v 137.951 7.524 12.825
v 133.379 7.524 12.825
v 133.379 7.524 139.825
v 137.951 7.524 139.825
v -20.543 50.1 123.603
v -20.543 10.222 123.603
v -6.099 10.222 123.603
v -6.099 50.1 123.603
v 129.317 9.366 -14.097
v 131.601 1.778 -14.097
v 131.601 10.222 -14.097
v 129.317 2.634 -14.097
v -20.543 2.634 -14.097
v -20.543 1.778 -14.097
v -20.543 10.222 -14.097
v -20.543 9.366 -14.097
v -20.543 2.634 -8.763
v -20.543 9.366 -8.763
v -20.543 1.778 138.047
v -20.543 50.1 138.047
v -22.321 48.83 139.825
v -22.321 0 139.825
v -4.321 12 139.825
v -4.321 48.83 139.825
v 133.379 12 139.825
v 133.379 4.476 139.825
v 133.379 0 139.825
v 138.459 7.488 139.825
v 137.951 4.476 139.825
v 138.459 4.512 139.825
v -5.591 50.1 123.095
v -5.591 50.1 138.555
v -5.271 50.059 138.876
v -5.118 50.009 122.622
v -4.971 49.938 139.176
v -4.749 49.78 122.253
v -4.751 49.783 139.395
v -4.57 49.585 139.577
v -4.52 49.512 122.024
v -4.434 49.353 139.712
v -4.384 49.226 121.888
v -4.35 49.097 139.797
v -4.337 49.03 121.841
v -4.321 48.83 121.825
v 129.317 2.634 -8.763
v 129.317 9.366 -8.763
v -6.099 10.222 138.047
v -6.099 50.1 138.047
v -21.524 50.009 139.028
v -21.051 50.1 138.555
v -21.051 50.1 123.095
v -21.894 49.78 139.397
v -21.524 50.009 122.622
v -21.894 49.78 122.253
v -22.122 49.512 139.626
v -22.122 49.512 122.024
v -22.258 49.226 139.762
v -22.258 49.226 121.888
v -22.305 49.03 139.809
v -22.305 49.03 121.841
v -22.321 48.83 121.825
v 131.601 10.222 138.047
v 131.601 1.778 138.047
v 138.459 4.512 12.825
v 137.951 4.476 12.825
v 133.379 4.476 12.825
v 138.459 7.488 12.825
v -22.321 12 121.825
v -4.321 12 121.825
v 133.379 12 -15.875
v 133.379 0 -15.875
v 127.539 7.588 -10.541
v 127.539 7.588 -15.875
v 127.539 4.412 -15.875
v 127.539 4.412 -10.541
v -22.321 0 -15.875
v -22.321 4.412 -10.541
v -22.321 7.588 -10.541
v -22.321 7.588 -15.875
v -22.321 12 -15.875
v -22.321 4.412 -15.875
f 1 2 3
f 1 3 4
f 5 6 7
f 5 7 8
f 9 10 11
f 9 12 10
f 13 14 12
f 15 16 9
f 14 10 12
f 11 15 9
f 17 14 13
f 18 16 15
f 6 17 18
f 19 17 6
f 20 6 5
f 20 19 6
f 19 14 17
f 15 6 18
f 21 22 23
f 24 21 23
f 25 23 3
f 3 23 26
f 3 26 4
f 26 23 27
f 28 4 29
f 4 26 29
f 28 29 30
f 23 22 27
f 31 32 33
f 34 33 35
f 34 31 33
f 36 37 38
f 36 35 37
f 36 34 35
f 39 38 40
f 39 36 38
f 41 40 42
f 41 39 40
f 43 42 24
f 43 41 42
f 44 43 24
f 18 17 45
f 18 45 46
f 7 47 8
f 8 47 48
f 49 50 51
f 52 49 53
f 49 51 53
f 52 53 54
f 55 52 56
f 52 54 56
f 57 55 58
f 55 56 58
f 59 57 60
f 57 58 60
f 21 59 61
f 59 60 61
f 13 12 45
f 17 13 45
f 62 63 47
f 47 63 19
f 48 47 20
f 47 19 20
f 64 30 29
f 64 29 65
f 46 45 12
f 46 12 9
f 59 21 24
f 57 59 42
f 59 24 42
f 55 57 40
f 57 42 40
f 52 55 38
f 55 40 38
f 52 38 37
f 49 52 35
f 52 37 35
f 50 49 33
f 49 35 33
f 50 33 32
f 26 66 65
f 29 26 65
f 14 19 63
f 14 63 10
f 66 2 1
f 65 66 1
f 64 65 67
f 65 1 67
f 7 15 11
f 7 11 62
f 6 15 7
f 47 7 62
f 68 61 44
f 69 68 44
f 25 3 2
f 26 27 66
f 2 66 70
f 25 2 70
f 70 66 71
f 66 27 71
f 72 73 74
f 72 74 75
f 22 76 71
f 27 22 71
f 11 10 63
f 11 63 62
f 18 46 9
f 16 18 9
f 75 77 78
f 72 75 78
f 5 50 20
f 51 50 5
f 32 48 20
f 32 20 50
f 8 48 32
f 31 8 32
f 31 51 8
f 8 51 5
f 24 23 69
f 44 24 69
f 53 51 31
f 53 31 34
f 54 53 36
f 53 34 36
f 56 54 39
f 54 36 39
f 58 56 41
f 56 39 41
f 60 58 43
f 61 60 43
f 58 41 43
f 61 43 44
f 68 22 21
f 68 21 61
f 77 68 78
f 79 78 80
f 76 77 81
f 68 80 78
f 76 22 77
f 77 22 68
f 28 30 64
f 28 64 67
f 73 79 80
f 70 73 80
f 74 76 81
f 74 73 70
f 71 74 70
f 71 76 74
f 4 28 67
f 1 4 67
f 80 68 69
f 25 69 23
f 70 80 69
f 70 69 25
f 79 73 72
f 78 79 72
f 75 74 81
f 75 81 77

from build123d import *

# Parameters (mm, degrees)
SKETCH1_W           = 155.7
SKETCH1_H           = 155.7
BOSS_EXTRUDE2_DEPTH = 12
SKETCH2_W           = 18
SKETCH2_H           = 18
BOSS_EXTRUDE3_DEPTH = 38.1
SKETCH3_W           = 5.08
SKETCH3_H           = 3.048
BOSS_EXTRUDE4_DEPTH = 127
CHAMFER1_SIZE       = 0.508
CHAMFER1_SIZE2      = 0.03552282
CHAMFER2_SIZE       = 0.508
CHAMFER2_SIZE2      = 0.03552282
SKETCH4_W           = 5.334
SKETCH4_H           = 3.175
CUT_EXTRUDE3_DEPTH  = 149.86
SHELL1_START        = -20.543212121
SHELL1_DEPTH        = 152.144
SHELL1_2_OUTLINE_W  = 39.878
SHELL1_2_OUTLINE_H  = 14.444
SHELL1_2_DEPTH      = 14.444
SHELL1_START_2      = 129.316787879
SHELL1_3_OUTLINE_W  = 6.731
SHELL1_3_OUTLINE_H  = 5.334
SHELL1_3_DEPTH      = 2.284
FILLET1_R           = 1.27


# Read off the part's stored shape, not the designer's step: Shell1
with BuildPart() as part:
    # Sketch1 → Boss-Extrude2 (new body)
    with BuildSketch(Plane(origin=(0, 0, 0), x_dir=(1, 0, 0), z_dir=(0, 1, 0))):
        with Locations((55.528787879, -61.975)):
            Rectangle(SKETCH1_W, SKETCH1_H)
    extrude(amount=BOSS_EXTRUDE2_DEPTH)

    # Sketch2 → Boss-Extrude3 (add)
    with BuildSketch(Plane(origin=(0, 12, 0), x_dir=(1, 0, 0), z_dir=(0, 1, 0))):
        with Locations((-13.321212121, -130.825)):
            Rectangle(SKETCH2_W, SKETCH2_H)
    extrude(amount=BOSS_EXTRUDE3_DEPTH)

    # Sketch3 → Boss-Extrude4 (add)
    with BuildSketch(Plane.XY.offset(139.825)):
        with Locations((135.918787879, 6)):
            Rectangle(SKETCH3_W, SKETCH3_H)
    extrude(amount=-BOSS_EXTRUDE4_DEPTH)

    # Chamfer1
    chamfer1_edges = [part.edges().sort_by_distance(p)[0] for p in [
        (138.458787879, 7.524, 76.325),
    ]]
    chamfer1_side = [part.faces().sort_by_distance(p)[0] for p in [
        (135.918787879, 7.524, 76.325),
    ]]
    chamfer(chamfer1_edges, length=CHAMFER1_SIZE, length2=CHAMFER1_SIZE2, reference=chamfer1_side[0])

    # Chamfer2
    chamfer2_edges = [part.edges().sort_by_distance(p)[0] for p in [
        (138.458787879, 4.476, 76.325),
    ]]
    chamfer2_side = [part.faces().sort_by_distance(p)[0] for p in [
        (135.918787879, 4.476, 76.325),
    ]]
    chamfer(chamfer2_edges, length=CHAMFER2_SIZE, length2=CHAMFER2_SIZE2, reference=chamfer2_side[0])

    # Sketch4 → Cut-Extrude3 (cut)
    with BuildSketch(Plane.ZY.offset(22.321212121)):
        with Locations((-13.208, 6)):
            Rectangle(SKETCH4_W, SKETCH4_H)
    extrude(amount=-CUT_EXTRUDE3_DEPTH, mode=Mode.SUBTRACT)

    # Shell1 outline → Shell1 (cut)
    with BuildSketch(Plane.YZ.offset(SHELL1_START)):
        Polygon((10.222, 138.047), (1.778, 138.047), (1.778, -14.097), (2.6345, -14.097), (2.6345, -8.763), (9.3655, -8.763), (9.3655, -14.097), (10.222, -14.097), align=None)
    extrude(amount=SHELL1_DEPTH, mode=Mode.SUBTRACT)

    # Shell1 2 outline → Shell1 2 (cut)
    with BuildSketch(Plane.YZ.offset(SHELL1_START)):
        with Locations((30.161, 130.825)):
            Rectangle(SHELL1_2_OUTLINE_W, SHELL1_2_OUTLINE_H)
    extrude(amount=SHELL1_2_DEPTH, mode=Mode.SUBTRACT)

    # Shell1 3 outline → Shell1 3 (cut)
    with BuildSketch(Plane.YZ.offset(SHELL1_START_2)):
        with Locations((6, -11.43)):
            Rectangle(SHELL1_3_OUTLINE_W, SHELL1_3_OUTLINE_H)
    extrude(amount=SHELL1_3_DEPTH, mode=Mode.SUBTRACT)

    # Fillet1
    fillet1_edges = [part.edges().sort_by_distance(p)[0] for p in [
        (-22.321212121, 50.1, 130.825),
        (-13.321212121, 50.1, 139.825),
        (-4.321212121, 50.1, 130.825),
        (-13.321212121, 50.1, 121.825),
    ]]
    fillet(fillet1_edges, radius=FILLET1_R)


solid = part.part
